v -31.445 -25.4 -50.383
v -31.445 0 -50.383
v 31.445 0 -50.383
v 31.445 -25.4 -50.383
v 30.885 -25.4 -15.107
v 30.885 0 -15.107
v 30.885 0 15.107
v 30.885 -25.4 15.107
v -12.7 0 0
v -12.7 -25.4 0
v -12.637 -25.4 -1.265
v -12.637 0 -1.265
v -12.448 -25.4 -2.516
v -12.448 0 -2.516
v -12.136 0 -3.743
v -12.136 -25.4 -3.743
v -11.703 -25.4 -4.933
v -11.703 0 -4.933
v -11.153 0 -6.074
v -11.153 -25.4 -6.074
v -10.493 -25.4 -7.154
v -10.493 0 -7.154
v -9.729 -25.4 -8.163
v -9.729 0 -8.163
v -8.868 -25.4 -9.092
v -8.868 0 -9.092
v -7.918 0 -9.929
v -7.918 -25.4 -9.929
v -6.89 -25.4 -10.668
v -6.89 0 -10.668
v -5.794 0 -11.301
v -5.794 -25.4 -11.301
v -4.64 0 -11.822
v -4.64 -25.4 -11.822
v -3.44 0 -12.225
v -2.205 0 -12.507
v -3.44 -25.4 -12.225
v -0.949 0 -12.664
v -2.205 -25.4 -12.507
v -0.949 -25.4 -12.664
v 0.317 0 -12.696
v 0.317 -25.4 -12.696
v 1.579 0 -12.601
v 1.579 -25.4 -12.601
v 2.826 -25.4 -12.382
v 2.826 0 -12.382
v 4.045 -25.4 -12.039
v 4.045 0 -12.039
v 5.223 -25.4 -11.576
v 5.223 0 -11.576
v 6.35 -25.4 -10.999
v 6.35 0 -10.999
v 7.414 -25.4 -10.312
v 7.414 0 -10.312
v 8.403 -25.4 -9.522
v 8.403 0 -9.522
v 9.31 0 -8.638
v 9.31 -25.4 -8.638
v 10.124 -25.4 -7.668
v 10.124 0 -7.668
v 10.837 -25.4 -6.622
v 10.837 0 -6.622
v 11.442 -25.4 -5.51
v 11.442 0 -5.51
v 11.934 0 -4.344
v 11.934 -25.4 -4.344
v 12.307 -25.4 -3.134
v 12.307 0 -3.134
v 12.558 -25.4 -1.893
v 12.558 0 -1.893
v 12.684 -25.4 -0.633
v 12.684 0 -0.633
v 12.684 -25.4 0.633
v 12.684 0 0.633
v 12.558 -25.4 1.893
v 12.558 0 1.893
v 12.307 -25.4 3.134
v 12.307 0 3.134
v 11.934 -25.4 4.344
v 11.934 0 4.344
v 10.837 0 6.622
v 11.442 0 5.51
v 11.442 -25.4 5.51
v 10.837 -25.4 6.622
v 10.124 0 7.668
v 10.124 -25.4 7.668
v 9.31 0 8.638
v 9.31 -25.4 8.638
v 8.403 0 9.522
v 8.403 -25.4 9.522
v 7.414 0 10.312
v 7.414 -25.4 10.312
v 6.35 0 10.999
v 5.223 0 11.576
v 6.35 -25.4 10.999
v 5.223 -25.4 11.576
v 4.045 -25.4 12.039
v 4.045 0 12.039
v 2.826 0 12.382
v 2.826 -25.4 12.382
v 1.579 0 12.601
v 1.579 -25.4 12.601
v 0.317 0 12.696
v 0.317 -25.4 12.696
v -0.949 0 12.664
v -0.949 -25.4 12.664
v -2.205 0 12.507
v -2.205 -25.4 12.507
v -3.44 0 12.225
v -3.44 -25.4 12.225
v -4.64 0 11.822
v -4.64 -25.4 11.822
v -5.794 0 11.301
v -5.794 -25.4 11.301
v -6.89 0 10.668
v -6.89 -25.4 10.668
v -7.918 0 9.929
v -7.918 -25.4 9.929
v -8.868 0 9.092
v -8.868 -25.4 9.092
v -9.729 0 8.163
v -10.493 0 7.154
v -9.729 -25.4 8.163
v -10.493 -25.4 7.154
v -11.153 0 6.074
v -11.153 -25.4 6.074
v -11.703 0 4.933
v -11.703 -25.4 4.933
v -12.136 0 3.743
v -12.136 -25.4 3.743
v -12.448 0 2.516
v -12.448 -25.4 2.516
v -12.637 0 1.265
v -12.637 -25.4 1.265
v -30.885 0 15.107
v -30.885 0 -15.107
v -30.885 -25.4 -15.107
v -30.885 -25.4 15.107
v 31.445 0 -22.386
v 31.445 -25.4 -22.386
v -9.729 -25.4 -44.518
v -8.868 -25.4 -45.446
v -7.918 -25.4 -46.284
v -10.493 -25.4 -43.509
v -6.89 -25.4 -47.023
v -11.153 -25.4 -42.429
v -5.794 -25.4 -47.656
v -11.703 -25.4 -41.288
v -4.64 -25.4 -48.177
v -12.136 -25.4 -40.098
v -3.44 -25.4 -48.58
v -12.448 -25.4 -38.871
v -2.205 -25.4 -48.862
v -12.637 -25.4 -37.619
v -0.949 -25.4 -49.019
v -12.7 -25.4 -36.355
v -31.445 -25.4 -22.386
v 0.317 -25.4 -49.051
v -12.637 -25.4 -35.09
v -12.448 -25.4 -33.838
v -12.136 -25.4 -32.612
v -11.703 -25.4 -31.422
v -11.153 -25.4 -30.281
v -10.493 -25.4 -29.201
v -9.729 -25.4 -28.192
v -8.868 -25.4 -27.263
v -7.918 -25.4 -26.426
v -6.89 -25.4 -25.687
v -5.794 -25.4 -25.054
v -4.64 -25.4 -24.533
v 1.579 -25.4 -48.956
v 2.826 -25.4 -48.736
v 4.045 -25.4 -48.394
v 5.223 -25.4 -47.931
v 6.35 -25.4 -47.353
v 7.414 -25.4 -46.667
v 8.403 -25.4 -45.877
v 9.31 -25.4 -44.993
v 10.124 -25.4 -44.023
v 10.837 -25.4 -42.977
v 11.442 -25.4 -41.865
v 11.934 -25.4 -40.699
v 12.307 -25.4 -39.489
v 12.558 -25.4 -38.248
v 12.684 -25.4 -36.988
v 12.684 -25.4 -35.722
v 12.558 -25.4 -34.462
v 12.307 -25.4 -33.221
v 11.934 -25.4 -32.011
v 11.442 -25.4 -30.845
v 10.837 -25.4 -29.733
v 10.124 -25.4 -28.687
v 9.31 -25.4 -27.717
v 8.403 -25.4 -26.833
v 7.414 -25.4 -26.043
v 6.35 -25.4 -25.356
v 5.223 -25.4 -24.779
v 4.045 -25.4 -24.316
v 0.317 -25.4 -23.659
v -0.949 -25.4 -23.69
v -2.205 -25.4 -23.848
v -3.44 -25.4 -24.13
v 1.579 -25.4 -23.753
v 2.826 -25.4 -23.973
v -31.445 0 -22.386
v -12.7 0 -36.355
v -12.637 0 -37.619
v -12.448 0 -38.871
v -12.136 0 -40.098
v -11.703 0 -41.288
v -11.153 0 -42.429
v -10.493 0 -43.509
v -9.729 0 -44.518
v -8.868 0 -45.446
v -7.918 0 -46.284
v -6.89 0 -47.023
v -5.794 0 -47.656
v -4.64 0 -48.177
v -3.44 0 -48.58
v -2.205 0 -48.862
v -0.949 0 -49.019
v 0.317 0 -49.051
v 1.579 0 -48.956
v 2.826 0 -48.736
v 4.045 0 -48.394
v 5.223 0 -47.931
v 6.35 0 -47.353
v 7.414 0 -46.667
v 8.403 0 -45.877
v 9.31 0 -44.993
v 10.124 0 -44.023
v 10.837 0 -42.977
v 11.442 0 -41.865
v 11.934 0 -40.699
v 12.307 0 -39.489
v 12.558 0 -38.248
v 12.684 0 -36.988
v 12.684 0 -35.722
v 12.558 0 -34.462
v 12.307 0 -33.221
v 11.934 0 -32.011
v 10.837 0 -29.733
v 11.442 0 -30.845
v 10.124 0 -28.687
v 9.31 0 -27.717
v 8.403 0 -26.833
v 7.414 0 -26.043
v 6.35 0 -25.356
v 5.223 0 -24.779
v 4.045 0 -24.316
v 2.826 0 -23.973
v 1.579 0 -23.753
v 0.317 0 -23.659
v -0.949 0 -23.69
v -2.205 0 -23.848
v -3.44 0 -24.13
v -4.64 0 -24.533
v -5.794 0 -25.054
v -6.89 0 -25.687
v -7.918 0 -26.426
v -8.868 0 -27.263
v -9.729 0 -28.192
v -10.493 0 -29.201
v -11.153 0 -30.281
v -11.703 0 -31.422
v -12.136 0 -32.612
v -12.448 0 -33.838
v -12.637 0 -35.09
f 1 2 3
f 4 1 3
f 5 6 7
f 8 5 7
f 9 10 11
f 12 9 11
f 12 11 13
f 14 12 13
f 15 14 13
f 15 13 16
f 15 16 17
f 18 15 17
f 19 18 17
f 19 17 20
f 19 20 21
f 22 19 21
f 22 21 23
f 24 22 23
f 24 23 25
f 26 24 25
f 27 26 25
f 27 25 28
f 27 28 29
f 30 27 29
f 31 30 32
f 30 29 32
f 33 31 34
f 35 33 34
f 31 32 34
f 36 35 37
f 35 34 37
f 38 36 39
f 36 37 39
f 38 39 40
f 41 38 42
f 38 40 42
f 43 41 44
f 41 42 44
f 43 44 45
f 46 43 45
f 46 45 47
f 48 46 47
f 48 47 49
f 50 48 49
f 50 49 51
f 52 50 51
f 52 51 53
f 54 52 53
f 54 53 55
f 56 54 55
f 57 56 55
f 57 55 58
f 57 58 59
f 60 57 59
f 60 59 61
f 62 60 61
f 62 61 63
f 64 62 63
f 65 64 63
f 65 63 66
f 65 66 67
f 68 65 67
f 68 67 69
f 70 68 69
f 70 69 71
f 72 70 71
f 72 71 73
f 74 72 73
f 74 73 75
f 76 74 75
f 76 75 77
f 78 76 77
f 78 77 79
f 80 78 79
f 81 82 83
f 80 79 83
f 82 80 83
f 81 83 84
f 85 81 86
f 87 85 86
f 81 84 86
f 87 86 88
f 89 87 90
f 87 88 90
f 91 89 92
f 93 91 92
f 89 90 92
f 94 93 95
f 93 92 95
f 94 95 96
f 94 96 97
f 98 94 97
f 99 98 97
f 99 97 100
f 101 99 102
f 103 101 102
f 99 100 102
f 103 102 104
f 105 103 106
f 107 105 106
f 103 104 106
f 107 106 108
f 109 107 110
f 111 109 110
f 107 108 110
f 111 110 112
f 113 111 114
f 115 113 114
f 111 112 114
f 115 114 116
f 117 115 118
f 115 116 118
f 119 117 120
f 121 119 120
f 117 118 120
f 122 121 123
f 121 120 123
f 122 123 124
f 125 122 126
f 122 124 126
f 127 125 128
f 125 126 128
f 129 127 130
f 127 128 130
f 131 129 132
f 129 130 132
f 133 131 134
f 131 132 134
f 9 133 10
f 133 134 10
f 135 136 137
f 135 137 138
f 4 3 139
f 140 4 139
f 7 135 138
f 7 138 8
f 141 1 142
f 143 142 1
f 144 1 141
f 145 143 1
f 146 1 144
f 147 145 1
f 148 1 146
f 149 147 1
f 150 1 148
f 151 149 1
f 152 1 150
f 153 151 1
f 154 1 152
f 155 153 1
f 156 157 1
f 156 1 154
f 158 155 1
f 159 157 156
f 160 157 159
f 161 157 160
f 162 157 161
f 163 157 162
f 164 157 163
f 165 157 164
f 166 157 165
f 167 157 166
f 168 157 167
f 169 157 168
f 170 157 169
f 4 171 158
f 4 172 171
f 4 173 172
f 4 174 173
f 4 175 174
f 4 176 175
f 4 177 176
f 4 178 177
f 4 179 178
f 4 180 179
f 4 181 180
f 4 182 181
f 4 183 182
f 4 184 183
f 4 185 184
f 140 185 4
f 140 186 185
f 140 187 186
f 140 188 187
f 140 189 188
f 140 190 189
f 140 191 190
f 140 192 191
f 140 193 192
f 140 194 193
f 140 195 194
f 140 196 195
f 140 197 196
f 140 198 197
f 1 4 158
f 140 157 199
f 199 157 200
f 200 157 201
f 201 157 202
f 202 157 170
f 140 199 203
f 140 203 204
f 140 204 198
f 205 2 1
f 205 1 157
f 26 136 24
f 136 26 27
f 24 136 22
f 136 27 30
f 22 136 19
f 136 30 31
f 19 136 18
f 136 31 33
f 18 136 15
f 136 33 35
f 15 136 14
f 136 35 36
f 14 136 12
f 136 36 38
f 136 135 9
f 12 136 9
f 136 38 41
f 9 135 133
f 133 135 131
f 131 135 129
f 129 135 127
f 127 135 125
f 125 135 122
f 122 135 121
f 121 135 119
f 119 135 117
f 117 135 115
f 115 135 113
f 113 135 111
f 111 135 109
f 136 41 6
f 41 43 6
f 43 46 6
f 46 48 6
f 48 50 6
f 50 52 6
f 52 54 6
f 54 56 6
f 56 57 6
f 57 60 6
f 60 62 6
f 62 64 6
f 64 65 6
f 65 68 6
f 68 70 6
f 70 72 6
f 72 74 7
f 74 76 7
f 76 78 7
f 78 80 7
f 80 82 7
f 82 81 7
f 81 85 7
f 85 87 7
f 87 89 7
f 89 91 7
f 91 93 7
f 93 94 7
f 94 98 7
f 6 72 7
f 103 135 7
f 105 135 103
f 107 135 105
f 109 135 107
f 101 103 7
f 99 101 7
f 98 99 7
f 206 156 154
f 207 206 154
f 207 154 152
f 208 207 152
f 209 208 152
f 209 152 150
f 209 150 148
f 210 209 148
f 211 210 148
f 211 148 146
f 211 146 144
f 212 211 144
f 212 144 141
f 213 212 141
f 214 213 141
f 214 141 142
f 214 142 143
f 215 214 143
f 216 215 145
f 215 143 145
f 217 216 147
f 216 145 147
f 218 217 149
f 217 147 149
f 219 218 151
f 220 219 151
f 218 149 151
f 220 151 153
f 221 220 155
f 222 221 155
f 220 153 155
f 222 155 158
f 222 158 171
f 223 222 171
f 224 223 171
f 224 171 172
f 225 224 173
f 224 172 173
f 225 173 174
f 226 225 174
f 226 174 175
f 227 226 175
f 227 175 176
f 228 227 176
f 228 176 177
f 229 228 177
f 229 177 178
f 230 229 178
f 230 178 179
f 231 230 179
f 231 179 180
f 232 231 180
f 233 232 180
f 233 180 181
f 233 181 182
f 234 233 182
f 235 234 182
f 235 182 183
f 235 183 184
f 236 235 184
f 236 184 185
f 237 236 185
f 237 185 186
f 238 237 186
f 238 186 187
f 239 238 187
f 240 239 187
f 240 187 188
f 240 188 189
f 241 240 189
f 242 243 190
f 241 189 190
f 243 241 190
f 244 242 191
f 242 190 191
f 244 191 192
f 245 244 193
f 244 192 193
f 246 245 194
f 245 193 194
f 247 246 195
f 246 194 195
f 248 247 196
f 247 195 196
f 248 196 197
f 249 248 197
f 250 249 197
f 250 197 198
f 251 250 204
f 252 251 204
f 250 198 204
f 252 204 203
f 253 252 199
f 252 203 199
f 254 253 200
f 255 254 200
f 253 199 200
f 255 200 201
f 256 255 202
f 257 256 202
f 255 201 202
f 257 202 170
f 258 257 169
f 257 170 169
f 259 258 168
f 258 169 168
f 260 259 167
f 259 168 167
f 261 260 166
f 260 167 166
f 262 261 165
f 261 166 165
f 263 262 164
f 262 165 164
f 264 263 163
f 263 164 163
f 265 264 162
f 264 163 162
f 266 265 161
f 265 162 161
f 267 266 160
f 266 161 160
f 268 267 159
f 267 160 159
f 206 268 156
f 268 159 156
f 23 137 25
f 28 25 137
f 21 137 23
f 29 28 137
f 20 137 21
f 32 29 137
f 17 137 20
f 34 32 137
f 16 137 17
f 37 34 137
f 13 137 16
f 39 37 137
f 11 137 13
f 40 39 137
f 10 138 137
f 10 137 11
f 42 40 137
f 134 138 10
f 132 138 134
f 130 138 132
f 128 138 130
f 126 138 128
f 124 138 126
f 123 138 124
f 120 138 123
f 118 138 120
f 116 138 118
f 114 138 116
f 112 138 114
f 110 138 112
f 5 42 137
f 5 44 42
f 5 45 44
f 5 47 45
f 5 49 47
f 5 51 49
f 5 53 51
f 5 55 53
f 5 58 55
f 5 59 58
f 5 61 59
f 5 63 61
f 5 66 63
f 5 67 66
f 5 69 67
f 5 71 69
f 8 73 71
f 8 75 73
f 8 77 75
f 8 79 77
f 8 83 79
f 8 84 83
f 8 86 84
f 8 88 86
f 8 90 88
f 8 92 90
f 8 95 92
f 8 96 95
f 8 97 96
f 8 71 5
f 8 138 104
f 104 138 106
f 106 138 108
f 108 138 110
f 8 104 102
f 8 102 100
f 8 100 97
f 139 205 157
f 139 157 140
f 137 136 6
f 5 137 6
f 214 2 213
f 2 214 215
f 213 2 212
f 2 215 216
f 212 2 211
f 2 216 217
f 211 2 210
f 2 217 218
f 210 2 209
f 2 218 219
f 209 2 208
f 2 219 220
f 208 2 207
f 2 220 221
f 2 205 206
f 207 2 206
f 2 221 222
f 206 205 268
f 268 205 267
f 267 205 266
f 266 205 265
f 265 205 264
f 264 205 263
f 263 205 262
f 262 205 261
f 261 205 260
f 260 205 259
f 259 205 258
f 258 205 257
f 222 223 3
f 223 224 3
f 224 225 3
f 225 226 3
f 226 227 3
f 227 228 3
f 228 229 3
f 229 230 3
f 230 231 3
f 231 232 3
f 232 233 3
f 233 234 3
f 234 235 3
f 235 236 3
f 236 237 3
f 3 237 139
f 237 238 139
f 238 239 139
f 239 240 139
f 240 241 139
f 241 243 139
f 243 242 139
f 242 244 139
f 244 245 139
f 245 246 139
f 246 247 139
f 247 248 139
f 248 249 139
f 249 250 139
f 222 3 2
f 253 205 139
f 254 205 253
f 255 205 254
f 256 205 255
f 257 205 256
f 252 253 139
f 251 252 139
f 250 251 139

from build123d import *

# Parameters (mm, degrees)
F0_W     = 62.8905072808
F0_H     = 27.9972478747
F1_DEPTH = 25.4
F0_W_2   = 61.7706142366
F0_H_2   = 30.2133560181
F3_D     = 25.4
F3_2_D   = 25.4


with BuildPart() as f1:
    # F0 (on Front) → F1 (new body)
    with BuildSketch(Plane.XZ):
        with Locations((0, -36.3845825195)):
            Rectangle(F0_W, F0_H)
    extrude(amount=F1_DEPTH)

    # F3 (through all)
    with Locations(Plane(origin=(0, 0, 0), x_dir=(1, 0, 0), z_dir=(0, 1, 0))):
        with Locations((0, 0), (0, 36.3549105823)):
            Hole(F3_D / 2)


with BuildPart() as f1b:
    # F0 (on Front) → F1, piece 2 (new body)
    with BuildSketch(Plane.XZ):
        Rectangle(F0_W_2, F0_H_2)
    extrude(amount=F1_DEPTH)

    # F3#2 (through all)
    with Locations(Plane(origin=(0, 0, 0), x_dir=(1, 0, 0), z_dir=(0, 1, 0))):
        with Locations((0, 0), (0, 36.3549105823)):
            Hole(F3_2_D / 2)


solid = Compound([f1.part, f1b.part])
